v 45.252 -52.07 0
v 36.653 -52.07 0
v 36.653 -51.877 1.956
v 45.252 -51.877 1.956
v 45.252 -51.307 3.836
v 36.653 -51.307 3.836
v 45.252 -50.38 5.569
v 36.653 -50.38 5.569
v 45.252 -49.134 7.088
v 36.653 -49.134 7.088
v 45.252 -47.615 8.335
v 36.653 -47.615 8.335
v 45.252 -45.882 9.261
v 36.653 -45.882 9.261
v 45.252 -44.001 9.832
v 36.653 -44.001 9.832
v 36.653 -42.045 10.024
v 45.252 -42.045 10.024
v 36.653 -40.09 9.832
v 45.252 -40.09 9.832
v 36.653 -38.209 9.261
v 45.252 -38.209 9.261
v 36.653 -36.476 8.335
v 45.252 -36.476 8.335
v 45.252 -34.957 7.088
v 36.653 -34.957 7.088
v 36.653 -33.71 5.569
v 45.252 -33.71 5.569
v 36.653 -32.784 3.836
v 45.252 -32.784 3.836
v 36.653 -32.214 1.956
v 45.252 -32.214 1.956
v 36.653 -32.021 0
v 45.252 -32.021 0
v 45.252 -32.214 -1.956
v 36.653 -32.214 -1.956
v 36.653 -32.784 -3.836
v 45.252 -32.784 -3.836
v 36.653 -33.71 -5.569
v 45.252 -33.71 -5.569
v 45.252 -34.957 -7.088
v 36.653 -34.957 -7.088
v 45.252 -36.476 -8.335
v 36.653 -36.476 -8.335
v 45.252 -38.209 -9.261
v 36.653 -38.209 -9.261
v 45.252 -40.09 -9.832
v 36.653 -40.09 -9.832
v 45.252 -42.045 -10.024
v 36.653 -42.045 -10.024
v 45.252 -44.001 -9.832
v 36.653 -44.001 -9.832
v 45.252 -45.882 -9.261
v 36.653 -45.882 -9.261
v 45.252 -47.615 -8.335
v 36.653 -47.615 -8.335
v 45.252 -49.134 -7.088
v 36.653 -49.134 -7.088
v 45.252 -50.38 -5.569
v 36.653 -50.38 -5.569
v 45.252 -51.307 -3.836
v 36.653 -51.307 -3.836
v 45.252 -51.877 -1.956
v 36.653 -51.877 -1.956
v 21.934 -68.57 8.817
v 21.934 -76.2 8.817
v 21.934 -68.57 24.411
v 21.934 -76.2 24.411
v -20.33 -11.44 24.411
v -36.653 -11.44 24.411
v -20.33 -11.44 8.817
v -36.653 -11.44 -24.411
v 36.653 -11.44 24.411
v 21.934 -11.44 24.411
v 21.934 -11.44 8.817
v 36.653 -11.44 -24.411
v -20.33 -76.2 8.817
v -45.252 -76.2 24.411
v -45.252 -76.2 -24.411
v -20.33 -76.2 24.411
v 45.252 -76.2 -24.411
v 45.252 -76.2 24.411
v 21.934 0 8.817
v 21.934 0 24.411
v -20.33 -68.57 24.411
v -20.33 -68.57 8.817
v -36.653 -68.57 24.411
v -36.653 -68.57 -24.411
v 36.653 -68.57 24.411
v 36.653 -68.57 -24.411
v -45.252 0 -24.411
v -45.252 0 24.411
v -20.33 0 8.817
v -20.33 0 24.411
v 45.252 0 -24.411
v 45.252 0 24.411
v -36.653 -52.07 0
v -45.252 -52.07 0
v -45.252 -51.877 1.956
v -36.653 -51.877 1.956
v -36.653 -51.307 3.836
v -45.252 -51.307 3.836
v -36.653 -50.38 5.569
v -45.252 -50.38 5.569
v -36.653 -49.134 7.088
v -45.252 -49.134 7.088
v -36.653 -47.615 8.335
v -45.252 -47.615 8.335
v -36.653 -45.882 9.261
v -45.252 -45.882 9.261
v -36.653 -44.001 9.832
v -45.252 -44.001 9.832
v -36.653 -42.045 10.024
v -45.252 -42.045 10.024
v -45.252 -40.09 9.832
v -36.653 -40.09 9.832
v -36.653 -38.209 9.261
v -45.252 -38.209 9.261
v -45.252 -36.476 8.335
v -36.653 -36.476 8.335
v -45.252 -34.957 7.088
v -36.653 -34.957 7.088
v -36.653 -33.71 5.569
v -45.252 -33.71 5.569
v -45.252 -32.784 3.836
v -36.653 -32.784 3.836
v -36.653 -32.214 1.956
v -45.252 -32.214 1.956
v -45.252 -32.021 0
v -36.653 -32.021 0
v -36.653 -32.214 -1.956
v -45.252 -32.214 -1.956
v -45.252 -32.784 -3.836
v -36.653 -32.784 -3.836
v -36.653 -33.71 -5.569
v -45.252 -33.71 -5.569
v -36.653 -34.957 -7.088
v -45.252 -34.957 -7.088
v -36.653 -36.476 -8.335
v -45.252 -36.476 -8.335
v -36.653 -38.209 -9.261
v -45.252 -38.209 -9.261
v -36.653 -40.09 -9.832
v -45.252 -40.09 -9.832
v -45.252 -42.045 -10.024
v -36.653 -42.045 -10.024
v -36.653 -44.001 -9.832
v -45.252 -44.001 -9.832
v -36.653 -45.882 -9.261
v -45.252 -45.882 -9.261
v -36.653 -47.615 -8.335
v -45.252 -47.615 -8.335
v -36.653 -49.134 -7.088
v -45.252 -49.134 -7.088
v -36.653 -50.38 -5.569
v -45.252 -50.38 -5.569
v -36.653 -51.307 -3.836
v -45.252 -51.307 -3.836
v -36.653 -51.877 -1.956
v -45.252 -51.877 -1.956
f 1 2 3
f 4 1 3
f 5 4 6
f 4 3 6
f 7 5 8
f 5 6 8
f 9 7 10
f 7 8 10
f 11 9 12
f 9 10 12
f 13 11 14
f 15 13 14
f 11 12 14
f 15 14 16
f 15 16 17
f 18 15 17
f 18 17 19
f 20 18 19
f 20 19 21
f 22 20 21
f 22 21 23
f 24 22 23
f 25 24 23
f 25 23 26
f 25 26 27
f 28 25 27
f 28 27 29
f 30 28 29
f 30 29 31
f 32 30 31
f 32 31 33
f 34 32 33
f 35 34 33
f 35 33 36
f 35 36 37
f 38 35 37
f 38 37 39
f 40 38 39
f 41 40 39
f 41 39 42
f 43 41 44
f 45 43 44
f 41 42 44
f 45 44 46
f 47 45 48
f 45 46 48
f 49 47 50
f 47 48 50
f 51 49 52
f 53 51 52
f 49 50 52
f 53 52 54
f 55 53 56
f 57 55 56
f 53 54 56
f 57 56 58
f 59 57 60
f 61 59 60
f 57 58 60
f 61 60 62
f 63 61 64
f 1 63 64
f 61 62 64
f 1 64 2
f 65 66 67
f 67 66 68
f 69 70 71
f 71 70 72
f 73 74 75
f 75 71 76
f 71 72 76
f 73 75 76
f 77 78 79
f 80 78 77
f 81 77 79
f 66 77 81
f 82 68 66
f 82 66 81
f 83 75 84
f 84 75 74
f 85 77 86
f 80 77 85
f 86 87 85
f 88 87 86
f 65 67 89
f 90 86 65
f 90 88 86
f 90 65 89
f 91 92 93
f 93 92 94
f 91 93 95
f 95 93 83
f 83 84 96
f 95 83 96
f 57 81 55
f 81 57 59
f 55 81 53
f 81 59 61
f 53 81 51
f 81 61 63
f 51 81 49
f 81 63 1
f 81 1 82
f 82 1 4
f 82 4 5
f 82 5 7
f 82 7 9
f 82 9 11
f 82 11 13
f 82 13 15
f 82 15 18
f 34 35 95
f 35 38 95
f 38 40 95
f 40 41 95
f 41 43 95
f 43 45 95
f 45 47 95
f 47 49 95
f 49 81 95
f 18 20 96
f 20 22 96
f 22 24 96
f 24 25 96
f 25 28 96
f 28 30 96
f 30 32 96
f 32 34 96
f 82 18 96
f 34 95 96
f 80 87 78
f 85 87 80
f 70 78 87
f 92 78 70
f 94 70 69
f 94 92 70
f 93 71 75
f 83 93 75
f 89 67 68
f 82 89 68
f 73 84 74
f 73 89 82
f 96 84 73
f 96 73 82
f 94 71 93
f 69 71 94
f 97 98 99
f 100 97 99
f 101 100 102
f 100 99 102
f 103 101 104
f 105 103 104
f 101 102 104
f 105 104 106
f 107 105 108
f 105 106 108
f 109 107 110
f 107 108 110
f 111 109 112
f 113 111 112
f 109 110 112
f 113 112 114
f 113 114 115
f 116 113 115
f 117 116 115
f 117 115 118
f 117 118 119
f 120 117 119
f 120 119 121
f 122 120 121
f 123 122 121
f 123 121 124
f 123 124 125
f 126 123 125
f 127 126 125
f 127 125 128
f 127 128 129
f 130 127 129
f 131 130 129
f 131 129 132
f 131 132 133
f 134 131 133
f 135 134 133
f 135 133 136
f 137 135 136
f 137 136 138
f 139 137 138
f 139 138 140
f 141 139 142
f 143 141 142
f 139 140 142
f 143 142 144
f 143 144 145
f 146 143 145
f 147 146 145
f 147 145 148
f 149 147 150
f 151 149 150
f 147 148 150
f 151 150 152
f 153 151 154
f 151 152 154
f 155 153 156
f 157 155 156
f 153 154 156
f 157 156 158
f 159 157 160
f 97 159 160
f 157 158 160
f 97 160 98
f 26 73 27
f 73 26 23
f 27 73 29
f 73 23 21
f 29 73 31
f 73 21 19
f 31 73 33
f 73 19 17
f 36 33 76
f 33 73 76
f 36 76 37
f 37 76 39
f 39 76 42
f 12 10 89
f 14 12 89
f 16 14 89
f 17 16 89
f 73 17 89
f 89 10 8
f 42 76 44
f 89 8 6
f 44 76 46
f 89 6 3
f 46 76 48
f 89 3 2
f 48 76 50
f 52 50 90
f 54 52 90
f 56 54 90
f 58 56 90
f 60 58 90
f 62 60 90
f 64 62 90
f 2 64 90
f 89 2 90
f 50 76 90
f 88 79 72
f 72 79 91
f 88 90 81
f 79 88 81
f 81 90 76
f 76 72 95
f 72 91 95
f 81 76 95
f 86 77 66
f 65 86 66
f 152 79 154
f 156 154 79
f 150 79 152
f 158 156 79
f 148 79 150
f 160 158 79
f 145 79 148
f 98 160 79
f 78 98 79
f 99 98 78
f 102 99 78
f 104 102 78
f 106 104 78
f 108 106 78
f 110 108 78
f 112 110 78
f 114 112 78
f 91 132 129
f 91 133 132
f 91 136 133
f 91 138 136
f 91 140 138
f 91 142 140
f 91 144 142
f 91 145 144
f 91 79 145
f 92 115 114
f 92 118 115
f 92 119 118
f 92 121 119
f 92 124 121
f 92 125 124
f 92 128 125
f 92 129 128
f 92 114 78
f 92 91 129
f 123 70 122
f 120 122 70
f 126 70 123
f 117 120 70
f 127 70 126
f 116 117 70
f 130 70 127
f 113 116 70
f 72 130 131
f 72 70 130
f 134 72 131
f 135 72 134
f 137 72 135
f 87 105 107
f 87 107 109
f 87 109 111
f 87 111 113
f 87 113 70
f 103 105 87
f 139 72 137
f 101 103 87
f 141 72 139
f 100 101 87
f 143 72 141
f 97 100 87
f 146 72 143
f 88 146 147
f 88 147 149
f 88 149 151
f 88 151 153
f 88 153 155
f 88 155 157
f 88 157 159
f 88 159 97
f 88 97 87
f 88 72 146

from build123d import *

# Parameters (mm, degrees)
F0_W     = 90.503112
F0_H     = 48.822132
F1_DEPTH = 76.2
F2_W     = 73.306068
F2_H     = 57.129182
F3_DEPTH = 76.2
F4_R     = 10.024428
F5_DEPTH = 101.6
F6_W     = 42.263934
F6_H     = 15.593934
F7_DEPTH = 101.6


with BuildPart() as f1:
    # F0 (on Front) → F1 (new body)
    with BuildSketch(Plane.XZ):
        Rectangle(F0_W, F0_H)
    extrude(amount=F1_DEPTH)

    # F2 (on face) → F3 (cut)
    with BuildSketch(Plane(origin=(0, 0, -24.411066), x_dir=(1, 0, 0), z_dir=(0, 0, -1))):
        with Locations((0, 40.005002)):
            Rectangle(F2_W, F2_H)
    extrude(amount=-F3_DEPTH, mode=Mode.SUBTRACT)

    # F4 (on face) → F5 (cut)
    with BuildSketch(Plane(origin=(-45.251556, 0, 0), x_dir=(0, -1, 0), z_dir=(-1, 0, 0))):
        with Locations((42.045325, 0)):
            Circle(F4_R)
    extrude(amount=-F5_DEPTH, mode=Mode.SUBTRACT)

    # F6 (on face) → F7 (cut)
    with BuildSketch(Plane.XZ.offset(76.2)):
        with Locations((0.801557, 16.614099)):
            Rectangle(F6_W, F6_H)
    extrude(amount=-F7_DEPTH, mode=Mode.SUBTRACT)


solid = f1.part
